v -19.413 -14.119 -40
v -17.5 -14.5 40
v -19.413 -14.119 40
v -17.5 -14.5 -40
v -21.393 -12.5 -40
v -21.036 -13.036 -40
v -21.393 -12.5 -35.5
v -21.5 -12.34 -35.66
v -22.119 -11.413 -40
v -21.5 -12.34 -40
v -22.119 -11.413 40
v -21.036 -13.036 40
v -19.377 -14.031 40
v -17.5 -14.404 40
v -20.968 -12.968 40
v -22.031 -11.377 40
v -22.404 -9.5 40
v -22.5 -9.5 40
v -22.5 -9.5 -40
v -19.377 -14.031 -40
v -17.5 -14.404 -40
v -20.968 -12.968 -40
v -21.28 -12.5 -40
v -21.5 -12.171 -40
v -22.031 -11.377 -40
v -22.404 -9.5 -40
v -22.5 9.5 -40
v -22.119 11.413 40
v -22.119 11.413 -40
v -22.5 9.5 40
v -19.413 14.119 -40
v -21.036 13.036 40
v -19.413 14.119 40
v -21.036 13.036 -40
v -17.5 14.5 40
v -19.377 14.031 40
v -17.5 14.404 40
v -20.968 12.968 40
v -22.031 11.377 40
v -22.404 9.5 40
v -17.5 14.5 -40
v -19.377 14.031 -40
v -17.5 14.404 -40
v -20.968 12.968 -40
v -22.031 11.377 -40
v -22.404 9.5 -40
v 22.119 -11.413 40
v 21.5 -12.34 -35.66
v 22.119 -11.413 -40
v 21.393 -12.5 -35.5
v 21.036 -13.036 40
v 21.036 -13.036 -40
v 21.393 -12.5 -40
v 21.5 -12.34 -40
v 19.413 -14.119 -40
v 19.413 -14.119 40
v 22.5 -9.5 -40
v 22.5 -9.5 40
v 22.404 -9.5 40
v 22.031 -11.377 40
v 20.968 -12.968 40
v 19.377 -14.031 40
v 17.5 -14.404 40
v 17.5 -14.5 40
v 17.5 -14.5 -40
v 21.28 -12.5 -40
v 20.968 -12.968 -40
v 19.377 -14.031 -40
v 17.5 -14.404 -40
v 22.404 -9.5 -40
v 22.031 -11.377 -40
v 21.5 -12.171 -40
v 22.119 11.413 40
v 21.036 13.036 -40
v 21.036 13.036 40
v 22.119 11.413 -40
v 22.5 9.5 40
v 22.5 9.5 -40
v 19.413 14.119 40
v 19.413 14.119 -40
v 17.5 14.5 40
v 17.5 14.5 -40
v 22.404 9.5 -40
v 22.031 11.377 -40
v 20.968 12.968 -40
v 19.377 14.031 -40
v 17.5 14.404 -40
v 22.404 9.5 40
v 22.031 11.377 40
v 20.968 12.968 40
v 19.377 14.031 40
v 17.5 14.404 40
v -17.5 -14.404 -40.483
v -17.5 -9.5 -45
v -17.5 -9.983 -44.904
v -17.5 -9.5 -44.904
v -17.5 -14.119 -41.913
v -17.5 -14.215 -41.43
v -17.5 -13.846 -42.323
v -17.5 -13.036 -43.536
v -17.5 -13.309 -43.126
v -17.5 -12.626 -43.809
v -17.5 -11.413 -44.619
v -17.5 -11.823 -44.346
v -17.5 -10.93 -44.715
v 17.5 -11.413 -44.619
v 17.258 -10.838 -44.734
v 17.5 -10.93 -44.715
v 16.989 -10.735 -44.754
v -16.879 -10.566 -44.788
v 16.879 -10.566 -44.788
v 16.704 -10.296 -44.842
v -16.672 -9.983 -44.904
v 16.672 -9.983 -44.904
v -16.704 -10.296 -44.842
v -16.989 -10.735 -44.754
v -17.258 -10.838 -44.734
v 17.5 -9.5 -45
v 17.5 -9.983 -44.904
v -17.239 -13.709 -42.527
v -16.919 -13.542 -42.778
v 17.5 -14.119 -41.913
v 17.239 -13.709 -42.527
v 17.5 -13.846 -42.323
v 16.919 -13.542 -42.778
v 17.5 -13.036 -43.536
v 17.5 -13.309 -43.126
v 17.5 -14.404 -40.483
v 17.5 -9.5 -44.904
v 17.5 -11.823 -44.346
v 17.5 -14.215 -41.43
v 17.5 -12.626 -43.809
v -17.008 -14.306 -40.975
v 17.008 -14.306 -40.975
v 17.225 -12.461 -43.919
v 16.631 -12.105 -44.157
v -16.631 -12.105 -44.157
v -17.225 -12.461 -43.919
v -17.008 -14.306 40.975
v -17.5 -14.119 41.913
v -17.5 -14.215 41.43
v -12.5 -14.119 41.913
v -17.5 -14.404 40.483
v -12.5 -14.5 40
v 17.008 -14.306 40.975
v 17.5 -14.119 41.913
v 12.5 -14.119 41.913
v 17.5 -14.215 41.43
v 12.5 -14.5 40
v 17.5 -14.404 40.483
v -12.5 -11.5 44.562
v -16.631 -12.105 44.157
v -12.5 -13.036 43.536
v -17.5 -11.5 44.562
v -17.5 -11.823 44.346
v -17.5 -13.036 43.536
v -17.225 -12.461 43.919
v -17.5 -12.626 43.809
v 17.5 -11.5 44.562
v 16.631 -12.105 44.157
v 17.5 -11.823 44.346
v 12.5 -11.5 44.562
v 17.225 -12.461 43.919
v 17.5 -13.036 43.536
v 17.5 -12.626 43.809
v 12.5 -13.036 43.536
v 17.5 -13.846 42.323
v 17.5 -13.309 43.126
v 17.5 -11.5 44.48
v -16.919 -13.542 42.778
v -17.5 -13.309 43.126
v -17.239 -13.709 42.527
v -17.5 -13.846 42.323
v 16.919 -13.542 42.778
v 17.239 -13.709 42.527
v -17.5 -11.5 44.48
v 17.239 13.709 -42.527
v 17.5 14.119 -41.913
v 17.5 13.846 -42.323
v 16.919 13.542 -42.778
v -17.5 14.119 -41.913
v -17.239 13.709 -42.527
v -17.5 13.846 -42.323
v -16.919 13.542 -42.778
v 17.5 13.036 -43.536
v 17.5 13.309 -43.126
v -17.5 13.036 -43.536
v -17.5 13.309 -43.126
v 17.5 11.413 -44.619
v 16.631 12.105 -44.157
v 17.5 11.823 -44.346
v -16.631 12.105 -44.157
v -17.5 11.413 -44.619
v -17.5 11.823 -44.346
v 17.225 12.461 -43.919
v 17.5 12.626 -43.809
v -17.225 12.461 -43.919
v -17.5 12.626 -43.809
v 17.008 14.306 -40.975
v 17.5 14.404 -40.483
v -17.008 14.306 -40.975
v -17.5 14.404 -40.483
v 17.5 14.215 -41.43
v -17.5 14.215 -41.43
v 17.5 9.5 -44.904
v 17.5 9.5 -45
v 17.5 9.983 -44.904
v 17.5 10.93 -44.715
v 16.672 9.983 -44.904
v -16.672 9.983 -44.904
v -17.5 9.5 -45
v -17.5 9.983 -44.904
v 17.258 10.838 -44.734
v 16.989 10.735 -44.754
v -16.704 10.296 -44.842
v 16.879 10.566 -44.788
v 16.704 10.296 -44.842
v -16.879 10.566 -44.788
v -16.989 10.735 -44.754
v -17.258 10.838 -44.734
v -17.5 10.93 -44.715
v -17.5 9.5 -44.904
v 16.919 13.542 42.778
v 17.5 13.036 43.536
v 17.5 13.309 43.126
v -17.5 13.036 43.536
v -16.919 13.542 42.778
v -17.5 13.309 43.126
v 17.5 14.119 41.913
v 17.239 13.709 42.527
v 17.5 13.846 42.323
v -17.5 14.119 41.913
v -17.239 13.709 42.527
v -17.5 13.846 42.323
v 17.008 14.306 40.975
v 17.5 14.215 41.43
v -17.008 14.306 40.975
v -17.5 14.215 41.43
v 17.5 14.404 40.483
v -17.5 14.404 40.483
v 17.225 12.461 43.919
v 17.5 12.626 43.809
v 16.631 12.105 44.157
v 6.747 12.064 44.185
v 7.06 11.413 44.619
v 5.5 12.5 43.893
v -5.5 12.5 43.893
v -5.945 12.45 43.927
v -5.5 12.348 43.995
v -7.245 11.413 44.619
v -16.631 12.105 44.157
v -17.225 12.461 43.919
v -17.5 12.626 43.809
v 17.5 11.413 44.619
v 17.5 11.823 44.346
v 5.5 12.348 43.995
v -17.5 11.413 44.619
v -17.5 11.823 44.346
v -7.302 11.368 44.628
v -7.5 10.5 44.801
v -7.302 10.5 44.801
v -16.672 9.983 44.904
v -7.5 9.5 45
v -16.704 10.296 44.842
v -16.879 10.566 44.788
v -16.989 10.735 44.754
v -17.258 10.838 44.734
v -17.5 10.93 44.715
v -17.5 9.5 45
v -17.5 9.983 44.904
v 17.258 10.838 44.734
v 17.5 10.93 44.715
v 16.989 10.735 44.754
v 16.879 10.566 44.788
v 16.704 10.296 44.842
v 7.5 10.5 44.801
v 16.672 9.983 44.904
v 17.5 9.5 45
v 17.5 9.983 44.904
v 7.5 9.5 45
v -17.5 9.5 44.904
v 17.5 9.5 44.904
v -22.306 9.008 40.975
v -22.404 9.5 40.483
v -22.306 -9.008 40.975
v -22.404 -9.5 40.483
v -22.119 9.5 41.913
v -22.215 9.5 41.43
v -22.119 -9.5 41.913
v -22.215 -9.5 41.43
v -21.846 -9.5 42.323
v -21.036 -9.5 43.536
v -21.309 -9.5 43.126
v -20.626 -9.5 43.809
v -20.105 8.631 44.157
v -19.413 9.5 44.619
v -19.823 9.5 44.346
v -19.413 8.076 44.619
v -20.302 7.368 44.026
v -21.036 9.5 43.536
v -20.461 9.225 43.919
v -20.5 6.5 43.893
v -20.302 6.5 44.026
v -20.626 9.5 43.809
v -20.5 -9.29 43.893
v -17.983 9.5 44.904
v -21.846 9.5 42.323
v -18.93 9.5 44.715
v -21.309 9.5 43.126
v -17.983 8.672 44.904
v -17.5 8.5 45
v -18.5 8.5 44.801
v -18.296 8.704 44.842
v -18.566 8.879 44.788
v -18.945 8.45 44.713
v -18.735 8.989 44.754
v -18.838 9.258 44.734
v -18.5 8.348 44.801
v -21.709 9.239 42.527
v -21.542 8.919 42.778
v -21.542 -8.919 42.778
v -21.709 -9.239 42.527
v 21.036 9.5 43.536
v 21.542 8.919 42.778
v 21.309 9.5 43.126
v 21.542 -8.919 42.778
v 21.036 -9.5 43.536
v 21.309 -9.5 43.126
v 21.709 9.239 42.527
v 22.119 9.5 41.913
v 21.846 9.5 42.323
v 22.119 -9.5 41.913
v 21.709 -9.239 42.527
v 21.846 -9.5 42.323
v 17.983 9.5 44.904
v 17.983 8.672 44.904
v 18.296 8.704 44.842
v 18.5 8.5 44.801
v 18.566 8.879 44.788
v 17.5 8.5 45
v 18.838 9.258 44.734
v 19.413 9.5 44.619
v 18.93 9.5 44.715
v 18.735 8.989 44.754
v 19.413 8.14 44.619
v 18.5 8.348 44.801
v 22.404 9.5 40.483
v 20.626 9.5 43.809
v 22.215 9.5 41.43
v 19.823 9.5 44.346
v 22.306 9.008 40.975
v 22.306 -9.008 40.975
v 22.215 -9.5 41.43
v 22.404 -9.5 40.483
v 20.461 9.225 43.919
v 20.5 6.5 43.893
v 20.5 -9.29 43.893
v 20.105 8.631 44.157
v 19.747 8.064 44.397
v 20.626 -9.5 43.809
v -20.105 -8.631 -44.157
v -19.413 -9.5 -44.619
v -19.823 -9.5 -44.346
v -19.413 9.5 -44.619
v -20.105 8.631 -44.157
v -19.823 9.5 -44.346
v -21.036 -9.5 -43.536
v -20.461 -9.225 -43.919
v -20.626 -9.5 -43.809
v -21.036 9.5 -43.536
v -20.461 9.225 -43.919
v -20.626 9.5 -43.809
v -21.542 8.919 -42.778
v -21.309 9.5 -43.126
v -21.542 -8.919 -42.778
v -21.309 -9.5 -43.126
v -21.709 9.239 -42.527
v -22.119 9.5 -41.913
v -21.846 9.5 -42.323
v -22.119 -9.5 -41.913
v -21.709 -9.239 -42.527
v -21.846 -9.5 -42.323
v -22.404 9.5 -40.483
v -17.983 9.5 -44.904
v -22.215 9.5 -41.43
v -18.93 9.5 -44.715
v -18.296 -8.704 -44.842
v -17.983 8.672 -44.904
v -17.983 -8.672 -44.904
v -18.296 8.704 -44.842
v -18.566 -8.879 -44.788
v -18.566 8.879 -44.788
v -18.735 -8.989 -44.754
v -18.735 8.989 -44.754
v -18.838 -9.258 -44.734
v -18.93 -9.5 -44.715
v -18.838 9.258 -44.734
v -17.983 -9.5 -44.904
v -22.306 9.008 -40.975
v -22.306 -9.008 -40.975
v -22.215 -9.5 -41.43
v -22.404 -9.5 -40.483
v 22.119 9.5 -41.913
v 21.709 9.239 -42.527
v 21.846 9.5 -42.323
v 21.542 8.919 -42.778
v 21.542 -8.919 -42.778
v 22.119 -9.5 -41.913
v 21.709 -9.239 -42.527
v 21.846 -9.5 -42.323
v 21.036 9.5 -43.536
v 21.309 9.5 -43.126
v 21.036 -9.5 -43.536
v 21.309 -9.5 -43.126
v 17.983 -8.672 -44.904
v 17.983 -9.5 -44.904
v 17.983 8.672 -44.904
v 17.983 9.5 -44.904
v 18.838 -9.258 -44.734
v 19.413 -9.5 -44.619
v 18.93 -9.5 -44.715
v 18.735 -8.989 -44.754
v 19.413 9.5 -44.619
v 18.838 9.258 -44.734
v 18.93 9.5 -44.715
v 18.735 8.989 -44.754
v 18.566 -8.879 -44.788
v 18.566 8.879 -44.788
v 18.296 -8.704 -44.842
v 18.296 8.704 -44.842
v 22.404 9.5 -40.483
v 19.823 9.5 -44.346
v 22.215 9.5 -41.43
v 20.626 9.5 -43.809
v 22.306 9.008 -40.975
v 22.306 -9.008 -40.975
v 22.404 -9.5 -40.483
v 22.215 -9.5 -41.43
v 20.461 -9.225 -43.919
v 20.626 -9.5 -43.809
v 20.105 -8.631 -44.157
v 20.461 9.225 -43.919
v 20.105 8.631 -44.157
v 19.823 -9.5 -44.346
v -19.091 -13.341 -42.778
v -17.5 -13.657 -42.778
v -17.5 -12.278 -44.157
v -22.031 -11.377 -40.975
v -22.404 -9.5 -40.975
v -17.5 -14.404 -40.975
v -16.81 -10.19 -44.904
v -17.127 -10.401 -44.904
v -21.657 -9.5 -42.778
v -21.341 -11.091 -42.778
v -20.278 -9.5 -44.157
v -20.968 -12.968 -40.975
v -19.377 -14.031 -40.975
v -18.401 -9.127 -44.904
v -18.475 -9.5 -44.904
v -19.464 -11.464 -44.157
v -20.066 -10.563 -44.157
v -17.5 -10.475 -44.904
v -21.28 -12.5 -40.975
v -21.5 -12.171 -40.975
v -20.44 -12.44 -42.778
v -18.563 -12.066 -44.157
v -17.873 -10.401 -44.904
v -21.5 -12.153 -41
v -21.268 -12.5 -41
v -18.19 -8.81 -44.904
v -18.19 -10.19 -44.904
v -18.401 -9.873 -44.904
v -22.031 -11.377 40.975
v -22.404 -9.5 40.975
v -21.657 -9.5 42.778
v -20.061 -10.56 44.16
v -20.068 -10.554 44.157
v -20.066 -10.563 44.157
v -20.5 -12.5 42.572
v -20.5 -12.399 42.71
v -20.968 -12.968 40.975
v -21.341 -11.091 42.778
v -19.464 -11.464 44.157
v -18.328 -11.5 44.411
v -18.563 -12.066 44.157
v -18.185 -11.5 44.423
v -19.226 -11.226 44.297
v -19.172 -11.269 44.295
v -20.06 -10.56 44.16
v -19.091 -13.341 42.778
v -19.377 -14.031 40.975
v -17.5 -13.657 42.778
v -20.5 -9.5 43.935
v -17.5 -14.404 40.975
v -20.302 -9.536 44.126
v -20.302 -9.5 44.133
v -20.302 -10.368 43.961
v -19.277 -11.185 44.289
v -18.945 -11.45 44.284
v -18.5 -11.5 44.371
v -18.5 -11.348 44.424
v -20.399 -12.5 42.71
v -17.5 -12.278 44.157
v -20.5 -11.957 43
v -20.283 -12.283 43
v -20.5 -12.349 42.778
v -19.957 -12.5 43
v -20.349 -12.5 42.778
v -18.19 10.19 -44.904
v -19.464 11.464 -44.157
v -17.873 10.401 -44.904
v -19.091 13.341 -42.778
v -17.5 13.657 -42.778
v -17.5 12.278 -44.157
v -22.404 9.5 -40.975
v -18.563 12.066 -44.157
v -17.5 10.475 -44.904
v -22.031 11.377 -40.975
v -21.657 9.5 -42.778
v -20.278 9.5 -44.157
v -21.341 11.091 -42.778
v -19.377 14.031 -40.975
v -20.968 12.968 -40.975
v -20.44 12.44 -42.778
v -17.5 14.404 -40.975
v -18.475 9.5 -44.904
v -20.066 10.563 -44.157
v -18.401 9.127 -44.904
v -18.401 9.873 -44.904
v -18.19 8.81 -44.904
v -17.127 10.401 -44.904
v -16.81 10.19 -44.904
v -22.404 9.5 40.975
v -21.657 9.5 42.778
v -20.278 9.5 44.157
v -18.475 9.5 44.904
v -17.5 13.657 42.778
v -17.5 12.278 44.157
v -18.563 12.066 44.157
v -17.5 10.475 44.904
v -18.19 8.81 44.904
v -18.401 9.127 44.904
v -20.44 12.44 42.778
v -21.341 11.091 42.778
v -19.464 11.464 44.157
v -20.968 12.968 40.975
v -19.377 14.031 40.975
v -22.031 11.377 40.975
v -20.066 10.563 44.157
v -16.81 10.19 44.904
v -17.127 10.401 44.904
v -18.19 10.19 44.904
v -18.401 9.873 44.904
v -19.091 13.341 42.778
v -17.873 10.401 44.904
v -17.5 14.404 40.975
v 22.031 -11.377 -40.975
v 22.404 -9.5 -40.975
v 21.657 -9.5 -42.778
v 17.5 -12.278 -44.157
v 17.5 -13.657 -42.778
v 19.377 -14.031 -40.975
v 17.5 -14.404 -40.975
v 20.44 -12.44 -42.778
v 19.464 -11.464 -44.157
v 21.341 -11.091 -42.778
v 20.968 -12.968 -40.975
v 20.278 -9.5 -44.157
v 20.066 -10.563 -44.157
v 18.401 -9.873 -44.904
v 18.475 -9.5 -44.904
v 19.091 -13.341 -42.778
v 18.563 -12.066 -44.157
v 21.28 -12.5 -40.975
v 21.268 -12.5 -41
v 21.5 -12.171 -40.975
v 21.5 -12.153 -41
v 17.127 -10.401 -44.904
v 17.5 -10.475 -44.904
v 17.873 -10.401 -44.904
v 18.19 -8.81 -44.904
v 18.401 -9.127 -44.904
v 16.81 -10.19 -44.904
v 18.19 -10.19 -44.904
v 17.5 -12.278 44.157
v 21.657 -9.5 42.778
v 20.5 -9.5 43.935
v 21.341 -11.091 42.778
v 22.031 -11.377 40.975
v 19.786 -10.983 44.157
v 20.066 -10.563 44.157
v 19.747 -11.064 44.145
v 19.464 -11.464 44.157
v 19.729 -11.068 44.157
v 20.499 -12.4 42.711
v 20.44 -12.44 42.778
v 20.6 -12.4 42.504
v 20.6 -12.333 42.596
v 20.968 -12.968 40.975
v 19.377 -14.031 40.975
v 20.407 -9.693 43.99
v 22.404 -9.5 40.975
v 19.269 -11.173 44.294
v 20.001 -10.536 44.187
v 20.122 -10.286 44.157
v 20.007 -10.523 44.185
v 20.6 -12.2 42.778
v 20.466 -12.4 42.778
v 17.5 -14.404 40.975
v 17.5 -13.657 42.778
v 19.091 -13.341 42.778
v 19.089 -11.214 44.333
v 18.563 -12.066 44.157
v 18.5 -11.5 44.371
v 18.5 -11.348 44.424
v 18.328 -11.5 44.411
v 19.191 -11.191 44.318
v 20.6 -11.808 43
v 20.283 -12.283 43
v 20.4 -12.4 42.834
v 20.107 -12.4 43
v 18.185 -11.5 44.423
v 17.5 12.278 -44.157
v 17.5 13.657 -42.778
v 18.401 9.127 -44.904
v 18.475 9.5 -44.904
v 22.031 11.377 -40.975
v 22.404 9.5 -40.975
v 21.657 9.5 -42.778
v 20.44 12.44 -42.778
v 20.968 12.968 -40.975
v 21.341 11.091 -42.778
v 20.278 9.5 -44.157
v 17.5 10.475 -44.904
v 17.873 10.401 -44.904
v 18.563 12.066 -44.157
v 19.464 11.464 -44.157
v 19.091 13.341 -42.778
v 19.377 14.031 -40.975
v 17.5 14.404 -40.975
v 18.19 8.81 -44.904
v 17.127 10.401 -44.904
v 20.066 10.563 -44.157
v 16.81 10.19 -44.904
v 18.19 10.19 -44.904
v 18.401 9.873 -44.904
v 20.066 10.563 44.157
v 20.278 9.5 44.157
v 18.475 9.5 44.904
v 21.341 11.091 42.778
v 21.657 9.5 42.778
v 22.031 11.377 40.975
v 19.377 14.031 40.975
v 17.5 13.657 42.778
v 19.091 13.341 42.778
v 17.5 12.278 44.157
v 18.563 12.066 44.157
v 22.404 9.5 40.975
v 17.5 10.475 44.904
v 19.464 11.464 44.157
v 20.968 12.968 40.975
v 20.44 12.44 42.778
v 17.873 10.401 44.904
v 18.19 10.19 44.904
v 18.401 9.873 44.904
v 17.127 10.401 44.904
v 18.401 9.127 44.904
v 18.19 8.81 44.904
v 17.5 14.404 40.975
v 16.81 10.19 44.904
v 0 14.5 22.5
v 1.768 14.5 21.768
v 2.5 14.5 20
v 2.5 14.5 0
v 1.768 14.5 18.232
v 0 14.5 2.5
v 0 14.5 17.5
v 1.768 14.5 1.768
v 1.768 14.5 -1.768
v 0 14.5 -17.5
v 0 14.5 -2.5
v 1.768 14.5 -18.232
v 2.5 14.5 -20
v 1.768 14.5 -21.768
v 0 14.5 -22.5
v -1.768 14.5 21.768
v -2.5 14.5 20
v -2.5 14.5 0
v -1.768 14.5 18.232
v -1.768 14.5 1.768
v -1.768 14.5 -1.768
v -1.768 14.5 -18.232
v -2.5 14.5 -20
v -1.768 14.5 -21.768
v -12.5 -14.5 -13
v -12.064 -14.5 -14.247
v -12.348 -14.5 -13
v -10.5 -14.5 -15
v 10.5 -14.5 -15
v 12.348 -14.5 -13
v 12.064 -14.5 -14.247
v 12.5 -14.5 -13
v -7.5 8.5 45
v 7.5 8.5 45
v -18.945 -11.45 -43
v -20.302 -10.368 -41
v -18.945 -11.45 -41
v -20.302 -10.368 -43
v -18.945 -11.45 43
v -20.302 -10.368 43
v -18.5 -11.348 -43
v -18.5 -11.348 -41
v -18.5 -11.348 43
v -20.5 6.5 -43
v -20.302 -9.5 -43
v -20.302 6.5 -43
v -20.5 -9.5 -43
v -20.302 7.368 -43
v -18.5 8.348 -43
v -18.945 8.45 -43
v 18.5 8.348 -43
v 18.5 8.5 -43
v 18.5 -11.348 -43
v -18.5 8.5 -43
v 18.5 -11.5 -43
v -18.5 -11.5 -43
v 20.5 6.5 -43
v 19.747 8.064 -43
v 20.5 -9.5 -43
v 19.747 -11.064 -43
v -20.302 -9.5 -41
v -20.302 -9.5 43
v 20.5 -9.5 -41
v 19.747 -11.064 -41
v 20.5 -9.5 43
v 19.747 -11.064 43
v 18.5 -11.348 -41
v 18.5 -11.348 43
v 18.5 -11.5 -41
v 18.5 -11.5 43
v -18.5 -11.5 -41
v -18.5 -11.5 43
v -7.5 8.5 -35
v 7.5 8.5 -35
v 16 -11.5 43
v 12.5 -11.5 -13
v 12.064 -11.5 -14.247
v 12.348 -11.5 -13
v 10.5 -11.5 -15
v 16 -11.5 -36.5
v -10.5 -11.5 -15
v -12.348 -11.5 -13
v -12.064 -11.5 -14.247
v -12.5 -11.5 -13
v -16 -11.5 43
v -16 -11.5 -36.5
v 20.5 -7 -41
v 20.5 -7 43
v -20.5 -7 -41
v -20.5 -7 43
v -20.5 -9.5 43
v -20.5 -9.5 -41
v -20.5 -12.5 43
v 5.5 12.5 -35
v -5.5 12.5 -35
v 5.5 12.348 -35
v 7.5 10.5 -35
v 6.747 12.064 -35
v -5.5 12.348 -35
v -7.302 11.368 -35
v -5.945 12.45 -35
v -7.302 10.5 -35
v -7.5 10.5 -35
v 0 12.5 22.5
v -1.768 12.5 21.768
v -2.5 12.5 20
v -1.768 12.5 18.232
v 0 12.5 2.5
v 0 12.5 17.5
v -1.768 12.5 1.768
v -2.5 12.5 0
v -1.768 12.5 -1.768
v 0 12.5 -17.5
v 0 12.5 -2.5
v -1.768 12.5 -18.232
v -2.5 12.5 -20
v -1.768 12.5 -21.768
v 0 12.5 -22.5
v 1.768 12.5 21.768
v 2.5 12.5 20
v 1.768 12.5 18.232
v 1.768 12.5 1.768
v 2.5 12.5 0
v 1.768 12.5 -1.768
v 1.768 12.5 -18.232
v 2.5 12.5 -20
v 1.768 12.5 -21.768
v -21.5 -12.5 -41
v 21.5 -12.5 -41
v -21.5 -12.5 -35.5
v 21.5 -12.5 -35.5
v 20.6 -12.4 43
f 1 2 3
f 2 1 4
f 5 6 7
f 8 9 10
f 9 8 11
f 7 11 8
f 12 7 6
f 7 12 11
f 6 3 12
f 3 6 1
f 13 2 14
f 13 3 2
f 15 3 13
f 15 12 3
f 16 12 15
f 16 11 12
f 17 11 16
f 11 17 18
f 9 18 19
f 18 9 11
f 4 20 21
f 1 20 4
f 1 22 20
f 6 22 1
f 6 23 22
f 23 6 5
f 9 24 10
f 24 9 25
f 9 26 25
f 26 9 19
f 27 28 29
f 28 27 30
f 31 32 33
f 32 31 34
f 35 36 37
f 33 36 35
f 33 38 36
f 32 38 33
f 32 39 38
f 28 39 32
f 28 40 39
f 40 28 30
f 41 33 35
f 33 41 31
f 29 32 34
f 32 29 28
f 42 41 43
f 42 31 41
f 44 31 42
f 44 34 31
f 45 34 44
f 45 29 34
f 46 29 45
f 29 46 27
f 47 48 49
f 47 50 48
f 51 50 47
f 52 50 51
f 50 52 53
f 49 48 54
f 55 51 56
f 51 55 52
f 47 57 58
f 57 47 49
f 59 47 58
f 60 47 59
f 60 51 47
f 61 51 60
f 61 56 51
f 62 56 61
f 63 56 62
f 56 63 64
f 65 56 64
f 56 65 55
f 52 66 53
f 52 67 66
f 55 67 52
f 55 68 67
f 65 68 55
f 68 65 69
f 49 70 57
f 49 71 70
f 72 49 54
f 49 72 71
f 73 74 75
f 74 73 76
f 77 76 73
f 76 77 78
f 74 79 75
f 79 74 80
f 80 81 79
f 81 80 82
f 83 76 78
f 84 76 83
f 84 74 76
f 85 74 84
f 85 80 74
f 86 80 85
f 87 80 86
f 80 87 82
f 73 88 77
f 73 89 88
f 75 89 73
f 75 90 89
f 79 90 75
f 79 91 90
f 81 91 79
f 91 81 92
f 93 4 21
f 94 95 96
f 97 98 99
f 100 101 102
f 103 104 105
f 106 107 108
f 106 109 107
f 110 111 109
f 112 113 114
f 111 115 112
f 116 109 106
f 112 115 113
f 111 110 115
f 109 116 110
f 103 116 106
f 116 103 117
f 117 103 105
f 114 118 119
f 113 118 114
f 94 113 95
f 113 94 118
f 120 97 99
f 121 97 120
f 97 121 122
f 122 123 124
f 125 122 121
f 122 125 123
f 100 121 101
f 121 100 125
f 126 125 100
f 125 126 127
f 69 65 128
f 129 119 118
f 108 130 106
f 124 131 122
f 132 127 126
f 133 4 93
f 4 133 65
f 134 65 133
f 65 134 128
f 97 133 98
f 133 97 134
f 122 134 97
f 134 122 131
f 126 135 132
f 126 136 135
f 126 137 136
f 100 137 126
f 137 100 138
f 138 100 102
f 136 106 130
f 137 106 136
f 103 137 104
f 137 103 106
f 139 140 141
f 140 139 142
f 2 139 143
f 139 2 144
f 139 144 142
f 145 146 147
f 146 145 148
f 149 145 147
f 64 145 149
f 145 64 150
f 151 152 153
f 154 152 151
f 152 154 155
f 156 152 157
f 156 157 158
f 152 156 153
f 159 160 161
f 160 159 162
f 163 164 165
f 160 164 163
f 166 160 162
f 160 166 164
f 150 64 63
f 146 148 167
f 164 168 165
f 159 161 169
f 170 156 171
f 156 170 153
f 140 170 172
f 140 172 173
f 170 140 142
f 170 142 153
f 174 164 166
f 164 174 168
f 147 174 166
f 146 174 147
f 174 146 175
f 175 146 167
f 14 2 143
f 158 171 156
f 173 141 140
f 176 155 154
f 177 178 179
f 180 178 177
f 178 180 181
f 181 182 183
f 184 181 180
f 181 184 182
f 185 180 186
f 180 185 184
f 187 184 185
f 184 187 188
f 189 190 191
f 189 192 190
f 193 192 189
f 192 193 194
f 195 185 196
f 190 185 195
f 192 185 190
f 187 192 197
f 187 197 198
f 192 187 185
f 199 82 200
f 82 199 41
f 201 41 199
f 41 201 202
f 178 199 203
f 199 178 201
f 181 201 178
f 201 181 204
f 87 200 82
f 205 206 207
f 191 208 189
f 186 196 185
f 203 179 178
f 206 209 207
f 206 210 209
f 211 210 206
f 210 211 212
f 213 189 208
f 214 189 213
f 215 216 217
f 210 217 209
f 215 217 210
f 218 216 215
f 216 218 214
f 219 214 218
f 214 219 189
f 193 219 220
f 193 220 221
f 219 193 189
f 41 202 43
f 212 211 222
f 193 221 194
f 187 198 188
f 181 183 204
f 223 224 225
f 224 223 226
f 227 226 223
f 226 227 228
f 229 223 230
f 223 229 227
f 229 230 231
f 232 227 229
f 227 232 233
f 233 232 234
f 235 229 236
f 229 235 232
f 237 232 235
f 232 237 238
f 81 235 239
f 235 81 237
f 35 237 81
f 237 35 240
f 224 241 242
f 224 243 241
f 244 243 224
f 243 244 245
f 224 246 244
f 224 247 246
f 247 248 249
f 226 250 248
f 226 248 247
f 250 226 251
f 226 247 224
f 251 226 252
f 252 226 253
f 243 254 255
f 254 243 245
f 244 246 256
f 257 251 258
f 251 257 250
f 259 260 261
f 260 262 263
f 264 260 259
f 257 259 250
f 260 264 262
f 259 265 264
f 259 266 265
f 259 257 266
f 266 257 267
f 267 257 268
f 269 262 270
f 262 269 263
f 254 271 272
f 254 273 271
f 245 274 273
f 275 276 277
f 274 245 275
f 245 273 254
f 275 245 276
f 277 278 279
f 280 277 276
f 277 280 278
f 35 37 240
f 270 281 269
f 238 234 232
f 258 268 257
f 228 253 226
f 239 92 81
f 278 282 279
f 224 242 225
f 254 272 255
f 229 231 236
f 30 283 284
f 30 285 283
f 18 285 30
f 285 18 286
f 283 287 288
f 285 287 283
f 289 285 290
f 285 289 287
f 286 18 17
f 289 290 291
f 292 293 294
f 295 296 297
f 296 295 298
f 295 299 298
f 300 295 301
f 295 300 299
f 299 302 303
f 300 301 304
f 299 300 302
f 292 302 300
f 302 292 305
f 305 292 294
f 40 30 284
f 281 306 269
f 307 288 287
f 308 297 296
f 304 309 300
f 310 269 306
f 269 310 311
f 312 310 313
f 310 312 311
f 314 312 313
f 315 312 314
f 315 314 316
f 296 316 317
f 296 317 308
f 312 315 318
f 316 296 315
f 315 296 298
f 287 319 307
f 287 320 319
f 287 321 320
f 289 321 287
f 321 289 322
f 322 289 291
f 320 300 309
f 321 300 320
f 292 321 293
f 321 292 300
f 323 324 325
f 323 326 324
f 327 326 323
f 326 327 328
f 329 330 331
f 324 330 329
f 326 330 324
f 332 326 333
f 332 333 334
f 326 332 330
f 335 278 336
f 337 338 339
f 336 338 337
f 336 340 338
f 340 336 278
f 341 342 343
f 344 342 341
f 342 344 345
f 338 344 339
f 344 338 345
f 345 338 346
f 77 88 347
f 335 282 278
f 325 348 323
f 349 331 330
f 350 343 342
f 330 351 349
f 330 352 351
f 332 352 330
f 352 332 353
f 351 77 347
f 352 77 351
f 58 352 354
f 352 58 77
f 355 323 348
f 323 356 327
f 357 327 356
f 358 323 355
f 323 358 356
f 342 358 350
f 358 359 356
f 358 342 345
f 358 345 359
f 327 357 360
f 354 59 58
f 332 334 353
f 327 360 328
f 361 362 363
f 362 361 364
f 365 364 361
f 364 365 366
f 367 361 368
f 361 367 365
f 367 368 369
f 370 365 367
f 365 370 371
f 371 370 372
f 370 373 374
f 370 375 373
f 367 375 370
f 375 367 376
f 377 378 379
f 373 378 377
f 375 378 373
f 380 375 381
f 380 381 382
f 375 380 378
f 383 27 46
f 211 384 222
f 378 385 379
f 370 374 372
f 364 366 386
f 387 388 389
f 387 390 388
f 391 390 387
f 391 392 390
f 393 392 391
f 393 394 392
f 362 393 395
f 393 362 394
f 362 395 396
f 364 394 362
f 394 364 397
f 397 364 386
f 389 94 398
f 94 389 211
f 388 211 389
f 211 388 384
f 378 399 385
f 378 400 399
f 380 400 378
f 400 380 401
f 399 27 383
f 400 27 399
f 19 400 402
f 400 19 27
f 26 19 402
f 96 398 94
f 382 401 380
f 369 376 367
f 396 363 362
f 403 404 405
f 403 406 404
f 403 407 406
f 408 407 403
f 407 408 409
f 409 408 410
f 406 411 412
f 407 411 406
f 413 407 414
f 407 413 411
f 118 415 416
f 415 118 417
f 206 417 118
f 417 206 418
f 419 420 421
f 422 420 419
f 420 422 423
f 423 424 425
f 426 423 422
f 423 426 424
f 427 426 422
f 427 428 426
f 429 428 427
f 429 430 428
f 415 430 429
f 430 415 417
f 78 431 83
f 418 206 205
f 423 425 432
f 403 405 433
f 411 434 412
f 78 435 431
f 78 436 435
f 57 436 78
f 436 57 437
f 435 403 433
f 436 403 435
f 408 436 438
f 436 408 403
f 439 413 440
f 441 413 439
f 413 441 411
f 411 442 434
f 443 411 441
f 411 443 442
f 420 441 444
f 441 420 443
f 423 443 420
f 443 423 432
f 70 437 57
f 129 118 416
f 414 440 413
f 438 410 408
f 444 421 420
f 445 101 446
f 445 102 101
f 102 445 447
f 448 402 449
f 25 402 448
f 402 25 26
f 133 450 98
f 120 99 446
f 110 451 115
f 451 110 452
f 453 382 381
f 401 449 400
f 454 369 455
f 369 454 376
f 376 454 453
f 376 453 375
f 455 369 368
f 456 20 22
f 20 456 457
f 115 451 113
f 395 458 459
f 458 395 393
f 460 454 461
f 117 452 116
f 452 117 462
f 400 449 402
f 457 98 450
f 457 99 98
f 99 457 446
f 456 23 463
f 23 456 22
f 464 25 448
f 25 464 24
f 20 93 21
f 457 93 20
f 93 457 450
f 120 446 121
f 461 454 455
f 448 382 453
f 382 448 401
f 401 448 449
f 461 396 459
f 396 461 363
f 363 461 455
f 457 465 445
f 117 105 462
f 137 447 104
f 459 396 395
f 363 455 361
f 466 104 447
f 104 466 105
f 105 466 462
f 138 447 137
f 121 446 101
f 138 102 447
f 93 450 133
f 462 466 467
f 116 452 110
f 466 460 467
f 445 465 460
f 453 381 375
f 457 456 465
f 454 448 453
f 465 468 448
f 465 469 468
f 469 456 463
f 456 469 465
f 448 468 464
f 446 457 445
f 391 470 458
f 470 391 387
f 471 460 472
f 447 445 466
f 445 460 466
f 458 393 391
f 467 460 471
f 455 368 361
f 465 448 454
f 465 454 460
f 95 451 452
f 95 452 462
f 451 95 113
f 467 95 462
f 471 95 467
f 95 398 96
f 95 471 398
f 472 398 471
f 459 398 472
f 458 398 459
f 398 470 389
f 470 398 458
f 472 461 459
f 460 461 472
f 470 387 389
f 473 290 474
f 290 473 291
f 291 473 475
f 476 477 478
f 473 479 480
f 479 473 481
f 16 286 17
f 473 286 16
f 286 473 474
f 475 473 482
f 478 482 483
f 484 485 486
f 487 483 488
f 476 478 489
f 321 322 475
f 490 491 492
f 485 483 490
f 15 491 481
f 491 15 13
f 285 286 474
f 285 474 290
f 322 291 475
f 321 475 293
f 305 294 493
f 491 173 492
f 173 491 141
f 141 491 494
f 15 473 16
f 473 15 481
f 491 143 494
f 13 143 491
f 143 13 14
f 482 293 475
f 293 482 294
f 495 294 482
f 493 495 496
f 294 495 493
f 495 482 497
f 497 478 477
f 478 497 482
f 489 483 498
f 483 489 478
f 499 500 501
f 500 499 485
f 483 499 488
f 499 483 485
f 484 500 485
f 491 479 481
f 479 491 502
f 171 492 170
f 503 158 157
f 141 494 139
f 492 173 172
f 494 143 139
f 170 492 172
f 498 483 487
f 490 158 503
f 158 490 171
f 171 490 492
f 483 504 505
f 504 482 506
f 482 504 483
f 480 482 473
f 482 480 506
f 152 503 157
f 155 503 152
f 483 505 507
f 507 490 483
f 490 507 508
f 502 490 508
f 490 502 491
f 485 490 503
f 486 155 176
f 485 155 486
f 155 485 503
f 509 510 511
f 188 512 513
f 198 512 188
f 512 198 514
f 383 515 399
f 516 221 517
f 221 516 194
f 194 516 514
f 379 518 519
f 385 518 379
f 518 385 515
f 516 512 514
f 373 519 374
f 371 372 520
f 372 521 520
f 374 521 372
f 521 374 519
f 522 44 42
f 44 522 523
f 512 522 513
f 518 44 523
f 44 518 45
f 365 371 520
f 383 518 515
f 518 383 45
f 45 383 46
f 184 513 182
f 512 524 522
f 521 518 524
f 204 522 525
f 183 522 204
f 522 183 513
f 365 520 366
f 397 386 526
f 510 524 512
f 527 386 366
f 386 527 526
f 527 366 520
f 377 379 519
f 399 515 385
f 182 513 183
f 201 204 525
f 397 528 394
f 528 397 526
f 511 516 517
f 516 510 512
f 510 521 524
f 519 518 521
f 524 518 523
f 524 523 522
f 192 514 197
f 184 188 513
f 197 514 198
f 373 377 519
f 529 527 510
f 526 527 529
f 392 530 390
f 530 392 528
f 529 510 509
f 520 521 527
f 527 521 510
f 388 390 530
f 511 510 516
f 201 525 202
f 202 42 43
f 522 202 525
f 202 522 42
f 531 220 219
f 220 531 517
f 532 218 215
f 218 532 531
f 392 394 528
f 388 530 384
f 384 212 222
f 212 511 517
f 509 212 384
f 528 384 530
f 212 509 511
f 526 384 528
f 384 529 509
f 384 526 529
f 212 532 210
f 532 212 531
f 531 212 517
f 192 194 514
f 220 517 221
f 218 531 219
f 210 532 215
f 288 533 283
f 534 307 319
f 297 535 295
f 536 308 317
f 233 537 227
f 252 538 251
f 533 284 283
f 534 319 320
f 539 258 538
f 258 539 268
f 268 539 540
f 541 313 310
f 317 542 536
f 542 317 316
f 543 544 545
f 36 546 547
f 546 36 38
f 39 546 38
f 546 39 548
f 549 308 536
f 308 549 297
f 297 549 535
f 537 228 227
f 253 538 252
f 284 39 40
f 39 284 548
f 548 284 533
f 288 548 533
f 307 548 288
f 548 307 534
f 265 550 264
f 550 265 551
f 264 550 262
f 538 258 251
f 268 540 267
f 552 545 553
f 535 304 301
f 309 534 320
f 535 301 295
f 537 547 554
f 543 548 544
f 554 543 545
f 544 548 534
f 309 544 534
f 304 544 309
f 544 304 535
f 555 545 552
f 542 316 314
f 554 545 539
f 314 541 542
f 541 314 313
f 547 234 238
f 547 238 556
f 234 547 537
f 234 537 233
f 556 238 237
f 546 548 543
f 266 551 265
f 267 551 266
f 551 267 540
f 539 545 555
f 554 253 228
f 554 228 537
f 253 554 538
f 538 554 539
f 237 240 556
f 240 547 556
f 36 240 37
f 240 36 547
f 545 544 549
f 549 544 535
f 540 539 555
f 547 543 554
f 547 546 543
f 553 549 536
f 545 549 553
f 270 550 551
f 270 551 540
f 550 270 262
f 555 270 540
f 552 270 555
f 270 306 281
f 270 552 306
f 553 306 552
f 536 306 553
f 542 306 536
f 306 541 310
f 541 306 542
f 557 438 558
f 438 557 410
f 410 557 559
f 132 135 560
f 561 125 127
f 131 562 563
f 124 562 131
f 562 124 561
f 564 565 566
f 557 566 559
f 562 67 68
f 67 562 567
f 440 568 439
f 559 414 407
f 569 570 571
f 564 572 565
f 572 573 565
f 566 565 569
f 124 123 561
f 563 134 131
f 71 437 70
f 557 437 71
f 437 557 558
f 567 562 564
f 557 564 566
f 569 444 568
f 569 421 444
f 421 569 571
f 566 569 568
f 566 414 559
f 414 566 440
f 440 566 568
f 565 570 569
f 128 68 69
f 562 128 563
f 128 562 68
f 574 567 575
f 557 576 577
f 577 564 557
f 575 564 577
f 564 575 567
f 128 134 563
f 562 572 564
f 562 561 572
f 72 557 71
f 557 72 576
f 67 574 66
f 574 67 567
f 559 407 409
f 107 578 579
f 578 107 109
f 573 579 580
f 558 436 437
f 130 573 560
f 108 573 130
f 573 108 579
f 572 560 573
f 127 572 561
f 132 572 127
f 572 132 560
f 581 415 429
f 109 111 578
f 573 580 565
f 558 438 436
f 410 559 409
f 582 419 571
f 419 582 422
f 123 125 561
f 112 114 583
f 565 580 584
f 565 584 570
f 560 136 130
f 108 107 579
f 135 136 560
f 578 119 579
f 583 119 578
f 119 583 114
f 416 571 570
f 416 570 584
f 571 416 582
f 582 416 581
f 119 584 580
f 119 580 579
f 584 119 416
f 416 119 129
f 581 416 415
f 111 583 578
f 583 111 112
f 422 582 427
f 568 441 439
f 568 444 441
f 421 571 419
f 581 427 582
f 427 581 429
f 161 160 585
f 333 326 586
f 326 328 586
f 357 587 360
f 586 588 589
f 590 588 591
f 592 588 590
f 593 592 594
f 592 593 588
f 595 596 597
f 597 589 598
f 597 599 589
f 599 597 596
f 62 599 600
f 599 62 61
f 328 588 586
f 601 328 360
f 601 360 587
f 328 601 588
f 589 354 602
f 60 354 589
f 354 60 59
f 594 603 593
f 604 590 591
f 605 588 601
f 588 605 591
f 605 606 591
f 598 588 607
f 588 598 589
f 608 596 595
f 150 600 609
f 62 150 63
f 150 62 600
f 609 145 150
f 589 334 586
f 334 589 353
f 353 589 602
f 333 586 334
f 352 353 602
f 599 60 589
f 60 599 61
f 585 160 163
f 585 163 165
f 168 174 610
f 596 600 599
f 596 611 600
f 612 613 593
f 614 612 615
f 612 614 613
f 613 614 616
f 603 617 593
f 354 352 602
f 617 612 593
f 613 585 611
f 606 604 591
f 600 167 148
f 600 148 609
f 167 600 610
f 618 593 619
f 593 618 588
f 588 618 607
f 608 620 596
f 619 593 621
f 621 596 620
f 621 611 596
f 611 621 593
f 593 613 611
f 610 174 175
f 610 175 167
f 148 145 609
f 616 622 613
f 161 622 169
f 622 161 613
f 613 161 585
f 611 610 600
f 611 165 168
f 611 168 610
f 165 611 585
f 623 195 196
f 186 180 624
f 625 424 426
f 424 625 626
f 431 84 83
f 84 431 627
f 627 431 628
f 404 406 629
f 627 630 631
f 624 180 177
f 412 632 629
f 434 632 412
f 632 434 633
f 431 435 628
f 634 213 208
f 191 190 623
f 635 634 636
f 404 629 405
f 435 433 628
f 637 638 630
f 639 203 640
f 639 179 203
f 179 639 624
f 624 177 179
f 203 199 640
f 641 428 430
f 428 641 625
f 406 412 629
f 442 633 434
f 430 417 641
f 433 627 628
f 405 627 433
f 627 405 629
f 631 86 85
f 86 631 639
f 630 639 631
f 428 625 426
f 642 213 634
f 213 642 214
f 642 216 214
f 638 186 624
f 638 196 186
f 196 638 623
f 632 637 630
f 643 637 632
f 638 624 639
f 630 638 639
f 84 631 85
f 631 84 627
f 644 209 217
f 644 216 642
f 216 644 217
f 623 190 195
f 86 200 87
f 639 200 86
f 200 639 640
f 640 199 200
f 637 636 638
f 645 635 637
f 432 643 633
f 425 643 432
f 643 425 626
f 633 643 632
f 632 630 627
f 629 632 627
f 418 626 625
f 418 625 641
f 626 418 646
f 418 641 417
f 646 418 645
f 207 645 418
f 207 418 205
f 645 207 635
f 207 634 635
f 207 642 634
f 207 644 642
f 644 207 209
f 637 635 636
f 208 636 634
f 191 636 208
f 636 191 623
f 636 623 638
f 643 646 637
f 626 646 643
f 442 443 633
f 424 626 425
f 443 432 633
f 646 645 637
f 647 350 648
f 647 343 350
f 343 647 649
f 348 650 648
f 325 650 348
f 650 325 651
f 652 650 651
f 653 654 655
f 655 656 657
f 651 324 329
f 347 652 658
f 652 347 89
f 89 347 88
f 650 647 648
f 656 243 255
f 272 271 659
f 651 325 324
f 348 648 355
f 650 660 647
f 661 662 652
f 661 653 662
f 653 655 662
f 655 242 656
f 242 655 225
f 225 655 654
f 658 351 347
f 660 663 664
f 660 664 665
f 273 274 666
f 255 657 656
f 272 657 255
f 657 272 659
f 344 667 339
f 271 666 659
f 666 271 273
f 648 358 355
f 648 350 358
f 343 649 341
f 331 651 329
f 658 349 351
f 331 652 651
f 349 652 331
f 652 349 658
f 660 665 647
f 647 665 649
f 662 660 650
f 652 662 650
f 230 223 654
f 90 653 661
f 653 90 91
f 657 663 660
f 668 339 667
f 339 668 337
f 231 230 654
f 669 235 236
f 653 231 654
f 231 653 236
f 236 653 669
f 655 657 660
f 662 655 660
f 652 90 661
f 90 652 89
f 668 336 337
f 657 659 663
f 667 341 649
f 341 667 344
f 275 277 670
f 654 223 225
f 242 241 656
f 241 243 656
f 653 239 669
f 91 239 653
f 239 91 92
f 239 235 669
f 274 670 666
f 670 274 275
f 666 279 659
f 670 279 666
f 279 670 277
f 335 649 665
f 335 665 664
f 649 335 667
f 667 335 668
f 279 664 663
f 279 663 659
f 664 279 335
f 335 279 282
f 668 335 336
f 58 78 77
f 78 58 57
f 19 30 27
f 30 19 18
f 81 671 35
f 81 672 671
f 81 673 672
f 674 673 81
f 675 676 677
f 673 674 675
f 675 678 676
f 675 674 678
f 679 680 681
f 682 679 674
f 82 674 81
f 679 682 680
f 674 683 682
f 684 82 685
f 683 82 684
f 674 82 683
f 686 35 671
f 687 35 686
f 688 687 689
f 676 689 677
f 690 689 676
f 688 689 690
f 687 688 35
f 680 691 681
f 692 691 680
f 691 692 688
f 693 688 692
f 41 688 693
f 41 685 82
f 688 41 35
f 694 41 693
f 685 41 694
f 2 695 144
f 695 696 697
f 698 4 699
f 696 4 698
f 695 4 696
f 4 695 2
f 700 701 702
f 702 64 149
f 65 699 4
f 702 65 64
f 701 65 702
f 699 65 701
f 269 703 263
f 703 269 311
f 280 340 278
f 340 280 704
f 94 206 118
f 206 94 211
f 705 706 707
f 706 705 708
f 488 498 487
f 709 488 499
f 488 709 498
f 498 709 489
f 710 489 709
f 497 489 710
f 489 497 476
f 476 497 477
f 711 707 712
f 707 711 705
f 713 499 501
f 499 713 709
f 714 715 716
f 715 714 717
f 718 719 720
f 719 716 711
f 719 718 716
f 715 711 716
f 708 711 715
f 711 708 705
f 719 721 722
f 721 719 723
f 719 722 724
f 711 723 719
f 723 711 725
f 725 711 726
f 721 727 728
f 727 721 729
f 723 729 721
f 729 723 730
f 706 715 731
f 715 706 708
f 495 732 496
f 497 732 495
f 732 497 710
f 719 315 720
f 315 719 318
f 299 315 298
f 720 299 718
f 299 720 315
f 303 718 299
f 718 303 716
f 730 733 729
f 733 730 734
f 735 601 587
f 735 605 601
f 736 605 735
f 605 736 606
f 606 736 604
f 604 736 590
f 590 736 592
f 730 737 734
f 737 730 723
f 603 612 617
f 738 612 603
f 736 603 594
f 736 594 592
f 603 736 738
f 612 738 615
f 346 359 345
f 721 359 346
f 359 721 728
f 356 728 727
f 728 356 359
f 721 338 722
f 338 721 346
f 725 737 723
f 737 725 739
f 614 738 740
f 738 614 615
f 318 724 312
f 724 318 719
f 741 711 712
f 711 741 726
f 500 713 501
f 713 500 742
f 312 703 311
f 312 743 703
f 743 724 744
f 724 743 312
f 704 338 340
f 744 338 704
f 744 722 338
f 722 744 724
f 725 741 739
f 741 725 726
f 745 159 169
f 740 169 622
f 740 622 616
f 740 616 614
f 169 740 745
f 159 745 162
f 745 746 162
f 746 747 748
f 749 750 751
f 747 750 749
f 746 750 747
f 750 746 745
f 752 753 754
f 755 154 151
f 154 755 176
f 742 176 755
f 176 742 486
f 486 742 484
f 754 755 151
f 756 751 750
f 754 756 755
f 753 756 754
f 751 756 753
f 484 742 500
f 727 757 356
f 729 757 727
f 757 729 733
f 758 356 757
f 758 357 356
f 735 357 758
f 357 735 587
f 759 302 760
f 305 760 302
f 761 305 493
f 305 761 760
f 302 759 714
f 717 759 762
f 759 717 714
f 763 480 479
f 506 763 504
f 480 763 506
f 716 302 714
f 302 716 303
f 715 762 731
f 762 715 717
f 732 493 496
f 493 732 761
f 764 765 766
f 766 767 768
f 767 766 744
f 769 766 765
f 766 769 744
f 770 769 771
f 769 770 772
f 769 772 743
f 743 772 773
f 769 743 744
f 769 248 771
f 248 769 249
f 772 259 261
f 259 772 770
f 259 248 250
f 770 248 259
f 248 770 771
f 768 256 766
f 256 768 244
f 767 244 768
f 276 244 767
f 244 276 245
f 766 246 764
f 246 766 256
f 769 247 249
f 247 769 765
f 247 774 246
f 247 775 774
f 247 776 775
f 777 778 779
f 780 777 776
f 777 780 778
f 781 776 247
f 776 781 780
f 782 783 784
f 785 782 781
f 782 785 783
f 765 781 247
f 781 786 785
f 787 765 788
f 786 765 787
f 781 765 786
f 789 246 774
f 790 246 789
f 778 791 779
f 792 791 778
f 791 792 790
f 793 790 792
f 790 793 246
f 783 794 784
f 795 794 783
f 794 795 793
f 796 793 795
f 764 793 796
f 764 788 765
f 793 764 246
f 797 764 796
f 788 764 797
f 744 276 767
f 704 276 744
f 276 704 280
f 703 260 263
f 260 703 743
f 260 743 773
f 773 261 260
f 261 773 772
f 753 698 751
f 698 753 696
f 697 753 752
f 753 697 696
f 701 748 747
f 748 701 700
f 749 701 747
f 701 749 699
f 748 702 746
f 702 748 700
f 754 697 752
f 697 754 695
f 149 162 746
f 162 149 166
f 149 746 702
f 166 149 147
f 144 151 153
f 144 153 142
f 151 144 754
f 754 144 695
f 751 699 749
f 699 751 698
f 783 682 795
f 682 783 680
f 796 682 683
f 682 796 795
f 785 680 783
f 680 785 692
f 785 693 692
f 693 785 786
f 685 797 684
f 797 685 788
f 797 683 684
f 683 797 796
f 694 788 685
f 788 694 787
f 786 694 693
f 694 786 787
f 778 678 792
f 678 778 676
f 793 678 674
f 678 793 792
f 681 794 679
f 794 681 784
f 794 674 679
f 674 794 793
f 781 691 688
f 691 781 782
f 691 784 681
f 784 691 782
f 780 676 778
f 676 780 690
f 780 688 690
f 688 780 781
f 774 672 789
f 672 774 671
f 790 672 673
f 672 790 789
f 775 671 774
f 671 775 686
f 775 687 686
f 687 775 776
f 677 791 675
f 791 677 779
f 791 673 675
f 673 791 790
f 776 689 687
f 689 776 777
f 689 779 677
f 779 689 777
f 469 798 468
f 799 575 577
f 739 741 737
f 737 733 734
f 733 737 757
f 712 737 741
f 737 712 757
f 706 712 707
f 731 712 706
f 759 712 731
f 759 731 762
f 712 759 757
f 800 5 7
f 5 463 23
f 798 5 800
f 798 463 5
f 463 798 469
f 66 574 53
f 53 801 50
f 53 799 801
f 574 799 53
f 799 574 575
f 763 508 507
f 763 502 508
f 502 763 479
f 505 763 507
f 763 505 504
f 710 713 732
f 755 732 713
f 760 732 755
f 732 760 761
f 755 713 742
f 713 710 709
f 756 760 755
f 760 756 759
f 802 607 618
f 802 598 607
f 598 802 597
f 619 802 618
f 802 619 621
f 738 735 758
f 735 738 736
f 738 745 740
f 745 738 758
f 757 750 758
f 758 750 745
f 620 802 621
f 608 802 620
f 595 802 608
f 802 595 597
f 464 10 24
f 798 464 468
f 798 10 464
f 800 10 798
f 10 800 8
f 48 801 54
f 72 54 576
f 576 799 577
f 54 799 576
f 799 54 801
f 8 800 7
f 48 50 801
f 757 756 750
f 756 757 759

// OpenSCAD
//--------------------------------------------------------------------
//	Filename:	RemoteControlHolder.scad
//	Author:		Robert H. Morrison (rhmorrison)
//	Created On:	15 October 2011
//--------------------------------------------------------------------

use <MCAD/boxes.scad>;

AddTriangles=1;	//[0:No,1:Yes]

KT=20;			// Remote Control Thickness
ST=5;			// Screw head Thickness
T=2;			// Thickness of walls
BD=KT+ST+2*T;	// Box Depth
BW=45;			// Box Width
BL=90;			// Box Length
FW=25;			// Front Hole Width

module Triangle(h) {
	linear_extrude(height=h, center=false, convexity=10, twist=0)
		polygon(
			points=[[0,0],[0,5.5],[5.5,5.5]],
			paths=[[0,1,2]]);
}

module BracketHoles() {
	for (i=[-20, 0, 20])
	{
		translate([0,KT/2,i])
			rotate([90,0,0])
				cylinder(h=KT, r=2.5, center=true);
	}
}

module RemoteControlBracket() {
	union() {
		difference() {
			roundedBox([BW,BD,BL], 5, false);			// Holder frame
			translate([0,-(ST-T)/2,T])
				roundedBox([BW-2*T,KT,BL], 2, true);	// Remote Control
			translate([0,ST/2,10])
				roundedBox([BW/3,KT,BL], 2, true);  	// Screw heads
			translate([0,-(KT+ST+T)/2,30])
				rotate([90,90,0])
					roundedBox([BL,FW,ST], 2, true);  // Cut-out FRONT
			BracketHoles();
		}

		if (AddTriangles)
		{
			translate([T+5.5-BW/2,T-BD/2,2*T-BL/2])
				rotate([0,0,90])
					Triangle(BL-T*3);						// LL corner
			translate([BW/2-T+0.1,T+5.6-BD/2,2*T-BL/2])
				rotate([0,0,180])
					Triangle(BL-T*3);						// LR corner
			translate([T/2-BW/2, 5.5+T-BD/2, 6-T-BL/2])
				rotate([0,90,0])
					rotate([0,0,180])
						Triangle(BW-T);					// Bottom
		}
	}
}

RemoteControlBracket();
